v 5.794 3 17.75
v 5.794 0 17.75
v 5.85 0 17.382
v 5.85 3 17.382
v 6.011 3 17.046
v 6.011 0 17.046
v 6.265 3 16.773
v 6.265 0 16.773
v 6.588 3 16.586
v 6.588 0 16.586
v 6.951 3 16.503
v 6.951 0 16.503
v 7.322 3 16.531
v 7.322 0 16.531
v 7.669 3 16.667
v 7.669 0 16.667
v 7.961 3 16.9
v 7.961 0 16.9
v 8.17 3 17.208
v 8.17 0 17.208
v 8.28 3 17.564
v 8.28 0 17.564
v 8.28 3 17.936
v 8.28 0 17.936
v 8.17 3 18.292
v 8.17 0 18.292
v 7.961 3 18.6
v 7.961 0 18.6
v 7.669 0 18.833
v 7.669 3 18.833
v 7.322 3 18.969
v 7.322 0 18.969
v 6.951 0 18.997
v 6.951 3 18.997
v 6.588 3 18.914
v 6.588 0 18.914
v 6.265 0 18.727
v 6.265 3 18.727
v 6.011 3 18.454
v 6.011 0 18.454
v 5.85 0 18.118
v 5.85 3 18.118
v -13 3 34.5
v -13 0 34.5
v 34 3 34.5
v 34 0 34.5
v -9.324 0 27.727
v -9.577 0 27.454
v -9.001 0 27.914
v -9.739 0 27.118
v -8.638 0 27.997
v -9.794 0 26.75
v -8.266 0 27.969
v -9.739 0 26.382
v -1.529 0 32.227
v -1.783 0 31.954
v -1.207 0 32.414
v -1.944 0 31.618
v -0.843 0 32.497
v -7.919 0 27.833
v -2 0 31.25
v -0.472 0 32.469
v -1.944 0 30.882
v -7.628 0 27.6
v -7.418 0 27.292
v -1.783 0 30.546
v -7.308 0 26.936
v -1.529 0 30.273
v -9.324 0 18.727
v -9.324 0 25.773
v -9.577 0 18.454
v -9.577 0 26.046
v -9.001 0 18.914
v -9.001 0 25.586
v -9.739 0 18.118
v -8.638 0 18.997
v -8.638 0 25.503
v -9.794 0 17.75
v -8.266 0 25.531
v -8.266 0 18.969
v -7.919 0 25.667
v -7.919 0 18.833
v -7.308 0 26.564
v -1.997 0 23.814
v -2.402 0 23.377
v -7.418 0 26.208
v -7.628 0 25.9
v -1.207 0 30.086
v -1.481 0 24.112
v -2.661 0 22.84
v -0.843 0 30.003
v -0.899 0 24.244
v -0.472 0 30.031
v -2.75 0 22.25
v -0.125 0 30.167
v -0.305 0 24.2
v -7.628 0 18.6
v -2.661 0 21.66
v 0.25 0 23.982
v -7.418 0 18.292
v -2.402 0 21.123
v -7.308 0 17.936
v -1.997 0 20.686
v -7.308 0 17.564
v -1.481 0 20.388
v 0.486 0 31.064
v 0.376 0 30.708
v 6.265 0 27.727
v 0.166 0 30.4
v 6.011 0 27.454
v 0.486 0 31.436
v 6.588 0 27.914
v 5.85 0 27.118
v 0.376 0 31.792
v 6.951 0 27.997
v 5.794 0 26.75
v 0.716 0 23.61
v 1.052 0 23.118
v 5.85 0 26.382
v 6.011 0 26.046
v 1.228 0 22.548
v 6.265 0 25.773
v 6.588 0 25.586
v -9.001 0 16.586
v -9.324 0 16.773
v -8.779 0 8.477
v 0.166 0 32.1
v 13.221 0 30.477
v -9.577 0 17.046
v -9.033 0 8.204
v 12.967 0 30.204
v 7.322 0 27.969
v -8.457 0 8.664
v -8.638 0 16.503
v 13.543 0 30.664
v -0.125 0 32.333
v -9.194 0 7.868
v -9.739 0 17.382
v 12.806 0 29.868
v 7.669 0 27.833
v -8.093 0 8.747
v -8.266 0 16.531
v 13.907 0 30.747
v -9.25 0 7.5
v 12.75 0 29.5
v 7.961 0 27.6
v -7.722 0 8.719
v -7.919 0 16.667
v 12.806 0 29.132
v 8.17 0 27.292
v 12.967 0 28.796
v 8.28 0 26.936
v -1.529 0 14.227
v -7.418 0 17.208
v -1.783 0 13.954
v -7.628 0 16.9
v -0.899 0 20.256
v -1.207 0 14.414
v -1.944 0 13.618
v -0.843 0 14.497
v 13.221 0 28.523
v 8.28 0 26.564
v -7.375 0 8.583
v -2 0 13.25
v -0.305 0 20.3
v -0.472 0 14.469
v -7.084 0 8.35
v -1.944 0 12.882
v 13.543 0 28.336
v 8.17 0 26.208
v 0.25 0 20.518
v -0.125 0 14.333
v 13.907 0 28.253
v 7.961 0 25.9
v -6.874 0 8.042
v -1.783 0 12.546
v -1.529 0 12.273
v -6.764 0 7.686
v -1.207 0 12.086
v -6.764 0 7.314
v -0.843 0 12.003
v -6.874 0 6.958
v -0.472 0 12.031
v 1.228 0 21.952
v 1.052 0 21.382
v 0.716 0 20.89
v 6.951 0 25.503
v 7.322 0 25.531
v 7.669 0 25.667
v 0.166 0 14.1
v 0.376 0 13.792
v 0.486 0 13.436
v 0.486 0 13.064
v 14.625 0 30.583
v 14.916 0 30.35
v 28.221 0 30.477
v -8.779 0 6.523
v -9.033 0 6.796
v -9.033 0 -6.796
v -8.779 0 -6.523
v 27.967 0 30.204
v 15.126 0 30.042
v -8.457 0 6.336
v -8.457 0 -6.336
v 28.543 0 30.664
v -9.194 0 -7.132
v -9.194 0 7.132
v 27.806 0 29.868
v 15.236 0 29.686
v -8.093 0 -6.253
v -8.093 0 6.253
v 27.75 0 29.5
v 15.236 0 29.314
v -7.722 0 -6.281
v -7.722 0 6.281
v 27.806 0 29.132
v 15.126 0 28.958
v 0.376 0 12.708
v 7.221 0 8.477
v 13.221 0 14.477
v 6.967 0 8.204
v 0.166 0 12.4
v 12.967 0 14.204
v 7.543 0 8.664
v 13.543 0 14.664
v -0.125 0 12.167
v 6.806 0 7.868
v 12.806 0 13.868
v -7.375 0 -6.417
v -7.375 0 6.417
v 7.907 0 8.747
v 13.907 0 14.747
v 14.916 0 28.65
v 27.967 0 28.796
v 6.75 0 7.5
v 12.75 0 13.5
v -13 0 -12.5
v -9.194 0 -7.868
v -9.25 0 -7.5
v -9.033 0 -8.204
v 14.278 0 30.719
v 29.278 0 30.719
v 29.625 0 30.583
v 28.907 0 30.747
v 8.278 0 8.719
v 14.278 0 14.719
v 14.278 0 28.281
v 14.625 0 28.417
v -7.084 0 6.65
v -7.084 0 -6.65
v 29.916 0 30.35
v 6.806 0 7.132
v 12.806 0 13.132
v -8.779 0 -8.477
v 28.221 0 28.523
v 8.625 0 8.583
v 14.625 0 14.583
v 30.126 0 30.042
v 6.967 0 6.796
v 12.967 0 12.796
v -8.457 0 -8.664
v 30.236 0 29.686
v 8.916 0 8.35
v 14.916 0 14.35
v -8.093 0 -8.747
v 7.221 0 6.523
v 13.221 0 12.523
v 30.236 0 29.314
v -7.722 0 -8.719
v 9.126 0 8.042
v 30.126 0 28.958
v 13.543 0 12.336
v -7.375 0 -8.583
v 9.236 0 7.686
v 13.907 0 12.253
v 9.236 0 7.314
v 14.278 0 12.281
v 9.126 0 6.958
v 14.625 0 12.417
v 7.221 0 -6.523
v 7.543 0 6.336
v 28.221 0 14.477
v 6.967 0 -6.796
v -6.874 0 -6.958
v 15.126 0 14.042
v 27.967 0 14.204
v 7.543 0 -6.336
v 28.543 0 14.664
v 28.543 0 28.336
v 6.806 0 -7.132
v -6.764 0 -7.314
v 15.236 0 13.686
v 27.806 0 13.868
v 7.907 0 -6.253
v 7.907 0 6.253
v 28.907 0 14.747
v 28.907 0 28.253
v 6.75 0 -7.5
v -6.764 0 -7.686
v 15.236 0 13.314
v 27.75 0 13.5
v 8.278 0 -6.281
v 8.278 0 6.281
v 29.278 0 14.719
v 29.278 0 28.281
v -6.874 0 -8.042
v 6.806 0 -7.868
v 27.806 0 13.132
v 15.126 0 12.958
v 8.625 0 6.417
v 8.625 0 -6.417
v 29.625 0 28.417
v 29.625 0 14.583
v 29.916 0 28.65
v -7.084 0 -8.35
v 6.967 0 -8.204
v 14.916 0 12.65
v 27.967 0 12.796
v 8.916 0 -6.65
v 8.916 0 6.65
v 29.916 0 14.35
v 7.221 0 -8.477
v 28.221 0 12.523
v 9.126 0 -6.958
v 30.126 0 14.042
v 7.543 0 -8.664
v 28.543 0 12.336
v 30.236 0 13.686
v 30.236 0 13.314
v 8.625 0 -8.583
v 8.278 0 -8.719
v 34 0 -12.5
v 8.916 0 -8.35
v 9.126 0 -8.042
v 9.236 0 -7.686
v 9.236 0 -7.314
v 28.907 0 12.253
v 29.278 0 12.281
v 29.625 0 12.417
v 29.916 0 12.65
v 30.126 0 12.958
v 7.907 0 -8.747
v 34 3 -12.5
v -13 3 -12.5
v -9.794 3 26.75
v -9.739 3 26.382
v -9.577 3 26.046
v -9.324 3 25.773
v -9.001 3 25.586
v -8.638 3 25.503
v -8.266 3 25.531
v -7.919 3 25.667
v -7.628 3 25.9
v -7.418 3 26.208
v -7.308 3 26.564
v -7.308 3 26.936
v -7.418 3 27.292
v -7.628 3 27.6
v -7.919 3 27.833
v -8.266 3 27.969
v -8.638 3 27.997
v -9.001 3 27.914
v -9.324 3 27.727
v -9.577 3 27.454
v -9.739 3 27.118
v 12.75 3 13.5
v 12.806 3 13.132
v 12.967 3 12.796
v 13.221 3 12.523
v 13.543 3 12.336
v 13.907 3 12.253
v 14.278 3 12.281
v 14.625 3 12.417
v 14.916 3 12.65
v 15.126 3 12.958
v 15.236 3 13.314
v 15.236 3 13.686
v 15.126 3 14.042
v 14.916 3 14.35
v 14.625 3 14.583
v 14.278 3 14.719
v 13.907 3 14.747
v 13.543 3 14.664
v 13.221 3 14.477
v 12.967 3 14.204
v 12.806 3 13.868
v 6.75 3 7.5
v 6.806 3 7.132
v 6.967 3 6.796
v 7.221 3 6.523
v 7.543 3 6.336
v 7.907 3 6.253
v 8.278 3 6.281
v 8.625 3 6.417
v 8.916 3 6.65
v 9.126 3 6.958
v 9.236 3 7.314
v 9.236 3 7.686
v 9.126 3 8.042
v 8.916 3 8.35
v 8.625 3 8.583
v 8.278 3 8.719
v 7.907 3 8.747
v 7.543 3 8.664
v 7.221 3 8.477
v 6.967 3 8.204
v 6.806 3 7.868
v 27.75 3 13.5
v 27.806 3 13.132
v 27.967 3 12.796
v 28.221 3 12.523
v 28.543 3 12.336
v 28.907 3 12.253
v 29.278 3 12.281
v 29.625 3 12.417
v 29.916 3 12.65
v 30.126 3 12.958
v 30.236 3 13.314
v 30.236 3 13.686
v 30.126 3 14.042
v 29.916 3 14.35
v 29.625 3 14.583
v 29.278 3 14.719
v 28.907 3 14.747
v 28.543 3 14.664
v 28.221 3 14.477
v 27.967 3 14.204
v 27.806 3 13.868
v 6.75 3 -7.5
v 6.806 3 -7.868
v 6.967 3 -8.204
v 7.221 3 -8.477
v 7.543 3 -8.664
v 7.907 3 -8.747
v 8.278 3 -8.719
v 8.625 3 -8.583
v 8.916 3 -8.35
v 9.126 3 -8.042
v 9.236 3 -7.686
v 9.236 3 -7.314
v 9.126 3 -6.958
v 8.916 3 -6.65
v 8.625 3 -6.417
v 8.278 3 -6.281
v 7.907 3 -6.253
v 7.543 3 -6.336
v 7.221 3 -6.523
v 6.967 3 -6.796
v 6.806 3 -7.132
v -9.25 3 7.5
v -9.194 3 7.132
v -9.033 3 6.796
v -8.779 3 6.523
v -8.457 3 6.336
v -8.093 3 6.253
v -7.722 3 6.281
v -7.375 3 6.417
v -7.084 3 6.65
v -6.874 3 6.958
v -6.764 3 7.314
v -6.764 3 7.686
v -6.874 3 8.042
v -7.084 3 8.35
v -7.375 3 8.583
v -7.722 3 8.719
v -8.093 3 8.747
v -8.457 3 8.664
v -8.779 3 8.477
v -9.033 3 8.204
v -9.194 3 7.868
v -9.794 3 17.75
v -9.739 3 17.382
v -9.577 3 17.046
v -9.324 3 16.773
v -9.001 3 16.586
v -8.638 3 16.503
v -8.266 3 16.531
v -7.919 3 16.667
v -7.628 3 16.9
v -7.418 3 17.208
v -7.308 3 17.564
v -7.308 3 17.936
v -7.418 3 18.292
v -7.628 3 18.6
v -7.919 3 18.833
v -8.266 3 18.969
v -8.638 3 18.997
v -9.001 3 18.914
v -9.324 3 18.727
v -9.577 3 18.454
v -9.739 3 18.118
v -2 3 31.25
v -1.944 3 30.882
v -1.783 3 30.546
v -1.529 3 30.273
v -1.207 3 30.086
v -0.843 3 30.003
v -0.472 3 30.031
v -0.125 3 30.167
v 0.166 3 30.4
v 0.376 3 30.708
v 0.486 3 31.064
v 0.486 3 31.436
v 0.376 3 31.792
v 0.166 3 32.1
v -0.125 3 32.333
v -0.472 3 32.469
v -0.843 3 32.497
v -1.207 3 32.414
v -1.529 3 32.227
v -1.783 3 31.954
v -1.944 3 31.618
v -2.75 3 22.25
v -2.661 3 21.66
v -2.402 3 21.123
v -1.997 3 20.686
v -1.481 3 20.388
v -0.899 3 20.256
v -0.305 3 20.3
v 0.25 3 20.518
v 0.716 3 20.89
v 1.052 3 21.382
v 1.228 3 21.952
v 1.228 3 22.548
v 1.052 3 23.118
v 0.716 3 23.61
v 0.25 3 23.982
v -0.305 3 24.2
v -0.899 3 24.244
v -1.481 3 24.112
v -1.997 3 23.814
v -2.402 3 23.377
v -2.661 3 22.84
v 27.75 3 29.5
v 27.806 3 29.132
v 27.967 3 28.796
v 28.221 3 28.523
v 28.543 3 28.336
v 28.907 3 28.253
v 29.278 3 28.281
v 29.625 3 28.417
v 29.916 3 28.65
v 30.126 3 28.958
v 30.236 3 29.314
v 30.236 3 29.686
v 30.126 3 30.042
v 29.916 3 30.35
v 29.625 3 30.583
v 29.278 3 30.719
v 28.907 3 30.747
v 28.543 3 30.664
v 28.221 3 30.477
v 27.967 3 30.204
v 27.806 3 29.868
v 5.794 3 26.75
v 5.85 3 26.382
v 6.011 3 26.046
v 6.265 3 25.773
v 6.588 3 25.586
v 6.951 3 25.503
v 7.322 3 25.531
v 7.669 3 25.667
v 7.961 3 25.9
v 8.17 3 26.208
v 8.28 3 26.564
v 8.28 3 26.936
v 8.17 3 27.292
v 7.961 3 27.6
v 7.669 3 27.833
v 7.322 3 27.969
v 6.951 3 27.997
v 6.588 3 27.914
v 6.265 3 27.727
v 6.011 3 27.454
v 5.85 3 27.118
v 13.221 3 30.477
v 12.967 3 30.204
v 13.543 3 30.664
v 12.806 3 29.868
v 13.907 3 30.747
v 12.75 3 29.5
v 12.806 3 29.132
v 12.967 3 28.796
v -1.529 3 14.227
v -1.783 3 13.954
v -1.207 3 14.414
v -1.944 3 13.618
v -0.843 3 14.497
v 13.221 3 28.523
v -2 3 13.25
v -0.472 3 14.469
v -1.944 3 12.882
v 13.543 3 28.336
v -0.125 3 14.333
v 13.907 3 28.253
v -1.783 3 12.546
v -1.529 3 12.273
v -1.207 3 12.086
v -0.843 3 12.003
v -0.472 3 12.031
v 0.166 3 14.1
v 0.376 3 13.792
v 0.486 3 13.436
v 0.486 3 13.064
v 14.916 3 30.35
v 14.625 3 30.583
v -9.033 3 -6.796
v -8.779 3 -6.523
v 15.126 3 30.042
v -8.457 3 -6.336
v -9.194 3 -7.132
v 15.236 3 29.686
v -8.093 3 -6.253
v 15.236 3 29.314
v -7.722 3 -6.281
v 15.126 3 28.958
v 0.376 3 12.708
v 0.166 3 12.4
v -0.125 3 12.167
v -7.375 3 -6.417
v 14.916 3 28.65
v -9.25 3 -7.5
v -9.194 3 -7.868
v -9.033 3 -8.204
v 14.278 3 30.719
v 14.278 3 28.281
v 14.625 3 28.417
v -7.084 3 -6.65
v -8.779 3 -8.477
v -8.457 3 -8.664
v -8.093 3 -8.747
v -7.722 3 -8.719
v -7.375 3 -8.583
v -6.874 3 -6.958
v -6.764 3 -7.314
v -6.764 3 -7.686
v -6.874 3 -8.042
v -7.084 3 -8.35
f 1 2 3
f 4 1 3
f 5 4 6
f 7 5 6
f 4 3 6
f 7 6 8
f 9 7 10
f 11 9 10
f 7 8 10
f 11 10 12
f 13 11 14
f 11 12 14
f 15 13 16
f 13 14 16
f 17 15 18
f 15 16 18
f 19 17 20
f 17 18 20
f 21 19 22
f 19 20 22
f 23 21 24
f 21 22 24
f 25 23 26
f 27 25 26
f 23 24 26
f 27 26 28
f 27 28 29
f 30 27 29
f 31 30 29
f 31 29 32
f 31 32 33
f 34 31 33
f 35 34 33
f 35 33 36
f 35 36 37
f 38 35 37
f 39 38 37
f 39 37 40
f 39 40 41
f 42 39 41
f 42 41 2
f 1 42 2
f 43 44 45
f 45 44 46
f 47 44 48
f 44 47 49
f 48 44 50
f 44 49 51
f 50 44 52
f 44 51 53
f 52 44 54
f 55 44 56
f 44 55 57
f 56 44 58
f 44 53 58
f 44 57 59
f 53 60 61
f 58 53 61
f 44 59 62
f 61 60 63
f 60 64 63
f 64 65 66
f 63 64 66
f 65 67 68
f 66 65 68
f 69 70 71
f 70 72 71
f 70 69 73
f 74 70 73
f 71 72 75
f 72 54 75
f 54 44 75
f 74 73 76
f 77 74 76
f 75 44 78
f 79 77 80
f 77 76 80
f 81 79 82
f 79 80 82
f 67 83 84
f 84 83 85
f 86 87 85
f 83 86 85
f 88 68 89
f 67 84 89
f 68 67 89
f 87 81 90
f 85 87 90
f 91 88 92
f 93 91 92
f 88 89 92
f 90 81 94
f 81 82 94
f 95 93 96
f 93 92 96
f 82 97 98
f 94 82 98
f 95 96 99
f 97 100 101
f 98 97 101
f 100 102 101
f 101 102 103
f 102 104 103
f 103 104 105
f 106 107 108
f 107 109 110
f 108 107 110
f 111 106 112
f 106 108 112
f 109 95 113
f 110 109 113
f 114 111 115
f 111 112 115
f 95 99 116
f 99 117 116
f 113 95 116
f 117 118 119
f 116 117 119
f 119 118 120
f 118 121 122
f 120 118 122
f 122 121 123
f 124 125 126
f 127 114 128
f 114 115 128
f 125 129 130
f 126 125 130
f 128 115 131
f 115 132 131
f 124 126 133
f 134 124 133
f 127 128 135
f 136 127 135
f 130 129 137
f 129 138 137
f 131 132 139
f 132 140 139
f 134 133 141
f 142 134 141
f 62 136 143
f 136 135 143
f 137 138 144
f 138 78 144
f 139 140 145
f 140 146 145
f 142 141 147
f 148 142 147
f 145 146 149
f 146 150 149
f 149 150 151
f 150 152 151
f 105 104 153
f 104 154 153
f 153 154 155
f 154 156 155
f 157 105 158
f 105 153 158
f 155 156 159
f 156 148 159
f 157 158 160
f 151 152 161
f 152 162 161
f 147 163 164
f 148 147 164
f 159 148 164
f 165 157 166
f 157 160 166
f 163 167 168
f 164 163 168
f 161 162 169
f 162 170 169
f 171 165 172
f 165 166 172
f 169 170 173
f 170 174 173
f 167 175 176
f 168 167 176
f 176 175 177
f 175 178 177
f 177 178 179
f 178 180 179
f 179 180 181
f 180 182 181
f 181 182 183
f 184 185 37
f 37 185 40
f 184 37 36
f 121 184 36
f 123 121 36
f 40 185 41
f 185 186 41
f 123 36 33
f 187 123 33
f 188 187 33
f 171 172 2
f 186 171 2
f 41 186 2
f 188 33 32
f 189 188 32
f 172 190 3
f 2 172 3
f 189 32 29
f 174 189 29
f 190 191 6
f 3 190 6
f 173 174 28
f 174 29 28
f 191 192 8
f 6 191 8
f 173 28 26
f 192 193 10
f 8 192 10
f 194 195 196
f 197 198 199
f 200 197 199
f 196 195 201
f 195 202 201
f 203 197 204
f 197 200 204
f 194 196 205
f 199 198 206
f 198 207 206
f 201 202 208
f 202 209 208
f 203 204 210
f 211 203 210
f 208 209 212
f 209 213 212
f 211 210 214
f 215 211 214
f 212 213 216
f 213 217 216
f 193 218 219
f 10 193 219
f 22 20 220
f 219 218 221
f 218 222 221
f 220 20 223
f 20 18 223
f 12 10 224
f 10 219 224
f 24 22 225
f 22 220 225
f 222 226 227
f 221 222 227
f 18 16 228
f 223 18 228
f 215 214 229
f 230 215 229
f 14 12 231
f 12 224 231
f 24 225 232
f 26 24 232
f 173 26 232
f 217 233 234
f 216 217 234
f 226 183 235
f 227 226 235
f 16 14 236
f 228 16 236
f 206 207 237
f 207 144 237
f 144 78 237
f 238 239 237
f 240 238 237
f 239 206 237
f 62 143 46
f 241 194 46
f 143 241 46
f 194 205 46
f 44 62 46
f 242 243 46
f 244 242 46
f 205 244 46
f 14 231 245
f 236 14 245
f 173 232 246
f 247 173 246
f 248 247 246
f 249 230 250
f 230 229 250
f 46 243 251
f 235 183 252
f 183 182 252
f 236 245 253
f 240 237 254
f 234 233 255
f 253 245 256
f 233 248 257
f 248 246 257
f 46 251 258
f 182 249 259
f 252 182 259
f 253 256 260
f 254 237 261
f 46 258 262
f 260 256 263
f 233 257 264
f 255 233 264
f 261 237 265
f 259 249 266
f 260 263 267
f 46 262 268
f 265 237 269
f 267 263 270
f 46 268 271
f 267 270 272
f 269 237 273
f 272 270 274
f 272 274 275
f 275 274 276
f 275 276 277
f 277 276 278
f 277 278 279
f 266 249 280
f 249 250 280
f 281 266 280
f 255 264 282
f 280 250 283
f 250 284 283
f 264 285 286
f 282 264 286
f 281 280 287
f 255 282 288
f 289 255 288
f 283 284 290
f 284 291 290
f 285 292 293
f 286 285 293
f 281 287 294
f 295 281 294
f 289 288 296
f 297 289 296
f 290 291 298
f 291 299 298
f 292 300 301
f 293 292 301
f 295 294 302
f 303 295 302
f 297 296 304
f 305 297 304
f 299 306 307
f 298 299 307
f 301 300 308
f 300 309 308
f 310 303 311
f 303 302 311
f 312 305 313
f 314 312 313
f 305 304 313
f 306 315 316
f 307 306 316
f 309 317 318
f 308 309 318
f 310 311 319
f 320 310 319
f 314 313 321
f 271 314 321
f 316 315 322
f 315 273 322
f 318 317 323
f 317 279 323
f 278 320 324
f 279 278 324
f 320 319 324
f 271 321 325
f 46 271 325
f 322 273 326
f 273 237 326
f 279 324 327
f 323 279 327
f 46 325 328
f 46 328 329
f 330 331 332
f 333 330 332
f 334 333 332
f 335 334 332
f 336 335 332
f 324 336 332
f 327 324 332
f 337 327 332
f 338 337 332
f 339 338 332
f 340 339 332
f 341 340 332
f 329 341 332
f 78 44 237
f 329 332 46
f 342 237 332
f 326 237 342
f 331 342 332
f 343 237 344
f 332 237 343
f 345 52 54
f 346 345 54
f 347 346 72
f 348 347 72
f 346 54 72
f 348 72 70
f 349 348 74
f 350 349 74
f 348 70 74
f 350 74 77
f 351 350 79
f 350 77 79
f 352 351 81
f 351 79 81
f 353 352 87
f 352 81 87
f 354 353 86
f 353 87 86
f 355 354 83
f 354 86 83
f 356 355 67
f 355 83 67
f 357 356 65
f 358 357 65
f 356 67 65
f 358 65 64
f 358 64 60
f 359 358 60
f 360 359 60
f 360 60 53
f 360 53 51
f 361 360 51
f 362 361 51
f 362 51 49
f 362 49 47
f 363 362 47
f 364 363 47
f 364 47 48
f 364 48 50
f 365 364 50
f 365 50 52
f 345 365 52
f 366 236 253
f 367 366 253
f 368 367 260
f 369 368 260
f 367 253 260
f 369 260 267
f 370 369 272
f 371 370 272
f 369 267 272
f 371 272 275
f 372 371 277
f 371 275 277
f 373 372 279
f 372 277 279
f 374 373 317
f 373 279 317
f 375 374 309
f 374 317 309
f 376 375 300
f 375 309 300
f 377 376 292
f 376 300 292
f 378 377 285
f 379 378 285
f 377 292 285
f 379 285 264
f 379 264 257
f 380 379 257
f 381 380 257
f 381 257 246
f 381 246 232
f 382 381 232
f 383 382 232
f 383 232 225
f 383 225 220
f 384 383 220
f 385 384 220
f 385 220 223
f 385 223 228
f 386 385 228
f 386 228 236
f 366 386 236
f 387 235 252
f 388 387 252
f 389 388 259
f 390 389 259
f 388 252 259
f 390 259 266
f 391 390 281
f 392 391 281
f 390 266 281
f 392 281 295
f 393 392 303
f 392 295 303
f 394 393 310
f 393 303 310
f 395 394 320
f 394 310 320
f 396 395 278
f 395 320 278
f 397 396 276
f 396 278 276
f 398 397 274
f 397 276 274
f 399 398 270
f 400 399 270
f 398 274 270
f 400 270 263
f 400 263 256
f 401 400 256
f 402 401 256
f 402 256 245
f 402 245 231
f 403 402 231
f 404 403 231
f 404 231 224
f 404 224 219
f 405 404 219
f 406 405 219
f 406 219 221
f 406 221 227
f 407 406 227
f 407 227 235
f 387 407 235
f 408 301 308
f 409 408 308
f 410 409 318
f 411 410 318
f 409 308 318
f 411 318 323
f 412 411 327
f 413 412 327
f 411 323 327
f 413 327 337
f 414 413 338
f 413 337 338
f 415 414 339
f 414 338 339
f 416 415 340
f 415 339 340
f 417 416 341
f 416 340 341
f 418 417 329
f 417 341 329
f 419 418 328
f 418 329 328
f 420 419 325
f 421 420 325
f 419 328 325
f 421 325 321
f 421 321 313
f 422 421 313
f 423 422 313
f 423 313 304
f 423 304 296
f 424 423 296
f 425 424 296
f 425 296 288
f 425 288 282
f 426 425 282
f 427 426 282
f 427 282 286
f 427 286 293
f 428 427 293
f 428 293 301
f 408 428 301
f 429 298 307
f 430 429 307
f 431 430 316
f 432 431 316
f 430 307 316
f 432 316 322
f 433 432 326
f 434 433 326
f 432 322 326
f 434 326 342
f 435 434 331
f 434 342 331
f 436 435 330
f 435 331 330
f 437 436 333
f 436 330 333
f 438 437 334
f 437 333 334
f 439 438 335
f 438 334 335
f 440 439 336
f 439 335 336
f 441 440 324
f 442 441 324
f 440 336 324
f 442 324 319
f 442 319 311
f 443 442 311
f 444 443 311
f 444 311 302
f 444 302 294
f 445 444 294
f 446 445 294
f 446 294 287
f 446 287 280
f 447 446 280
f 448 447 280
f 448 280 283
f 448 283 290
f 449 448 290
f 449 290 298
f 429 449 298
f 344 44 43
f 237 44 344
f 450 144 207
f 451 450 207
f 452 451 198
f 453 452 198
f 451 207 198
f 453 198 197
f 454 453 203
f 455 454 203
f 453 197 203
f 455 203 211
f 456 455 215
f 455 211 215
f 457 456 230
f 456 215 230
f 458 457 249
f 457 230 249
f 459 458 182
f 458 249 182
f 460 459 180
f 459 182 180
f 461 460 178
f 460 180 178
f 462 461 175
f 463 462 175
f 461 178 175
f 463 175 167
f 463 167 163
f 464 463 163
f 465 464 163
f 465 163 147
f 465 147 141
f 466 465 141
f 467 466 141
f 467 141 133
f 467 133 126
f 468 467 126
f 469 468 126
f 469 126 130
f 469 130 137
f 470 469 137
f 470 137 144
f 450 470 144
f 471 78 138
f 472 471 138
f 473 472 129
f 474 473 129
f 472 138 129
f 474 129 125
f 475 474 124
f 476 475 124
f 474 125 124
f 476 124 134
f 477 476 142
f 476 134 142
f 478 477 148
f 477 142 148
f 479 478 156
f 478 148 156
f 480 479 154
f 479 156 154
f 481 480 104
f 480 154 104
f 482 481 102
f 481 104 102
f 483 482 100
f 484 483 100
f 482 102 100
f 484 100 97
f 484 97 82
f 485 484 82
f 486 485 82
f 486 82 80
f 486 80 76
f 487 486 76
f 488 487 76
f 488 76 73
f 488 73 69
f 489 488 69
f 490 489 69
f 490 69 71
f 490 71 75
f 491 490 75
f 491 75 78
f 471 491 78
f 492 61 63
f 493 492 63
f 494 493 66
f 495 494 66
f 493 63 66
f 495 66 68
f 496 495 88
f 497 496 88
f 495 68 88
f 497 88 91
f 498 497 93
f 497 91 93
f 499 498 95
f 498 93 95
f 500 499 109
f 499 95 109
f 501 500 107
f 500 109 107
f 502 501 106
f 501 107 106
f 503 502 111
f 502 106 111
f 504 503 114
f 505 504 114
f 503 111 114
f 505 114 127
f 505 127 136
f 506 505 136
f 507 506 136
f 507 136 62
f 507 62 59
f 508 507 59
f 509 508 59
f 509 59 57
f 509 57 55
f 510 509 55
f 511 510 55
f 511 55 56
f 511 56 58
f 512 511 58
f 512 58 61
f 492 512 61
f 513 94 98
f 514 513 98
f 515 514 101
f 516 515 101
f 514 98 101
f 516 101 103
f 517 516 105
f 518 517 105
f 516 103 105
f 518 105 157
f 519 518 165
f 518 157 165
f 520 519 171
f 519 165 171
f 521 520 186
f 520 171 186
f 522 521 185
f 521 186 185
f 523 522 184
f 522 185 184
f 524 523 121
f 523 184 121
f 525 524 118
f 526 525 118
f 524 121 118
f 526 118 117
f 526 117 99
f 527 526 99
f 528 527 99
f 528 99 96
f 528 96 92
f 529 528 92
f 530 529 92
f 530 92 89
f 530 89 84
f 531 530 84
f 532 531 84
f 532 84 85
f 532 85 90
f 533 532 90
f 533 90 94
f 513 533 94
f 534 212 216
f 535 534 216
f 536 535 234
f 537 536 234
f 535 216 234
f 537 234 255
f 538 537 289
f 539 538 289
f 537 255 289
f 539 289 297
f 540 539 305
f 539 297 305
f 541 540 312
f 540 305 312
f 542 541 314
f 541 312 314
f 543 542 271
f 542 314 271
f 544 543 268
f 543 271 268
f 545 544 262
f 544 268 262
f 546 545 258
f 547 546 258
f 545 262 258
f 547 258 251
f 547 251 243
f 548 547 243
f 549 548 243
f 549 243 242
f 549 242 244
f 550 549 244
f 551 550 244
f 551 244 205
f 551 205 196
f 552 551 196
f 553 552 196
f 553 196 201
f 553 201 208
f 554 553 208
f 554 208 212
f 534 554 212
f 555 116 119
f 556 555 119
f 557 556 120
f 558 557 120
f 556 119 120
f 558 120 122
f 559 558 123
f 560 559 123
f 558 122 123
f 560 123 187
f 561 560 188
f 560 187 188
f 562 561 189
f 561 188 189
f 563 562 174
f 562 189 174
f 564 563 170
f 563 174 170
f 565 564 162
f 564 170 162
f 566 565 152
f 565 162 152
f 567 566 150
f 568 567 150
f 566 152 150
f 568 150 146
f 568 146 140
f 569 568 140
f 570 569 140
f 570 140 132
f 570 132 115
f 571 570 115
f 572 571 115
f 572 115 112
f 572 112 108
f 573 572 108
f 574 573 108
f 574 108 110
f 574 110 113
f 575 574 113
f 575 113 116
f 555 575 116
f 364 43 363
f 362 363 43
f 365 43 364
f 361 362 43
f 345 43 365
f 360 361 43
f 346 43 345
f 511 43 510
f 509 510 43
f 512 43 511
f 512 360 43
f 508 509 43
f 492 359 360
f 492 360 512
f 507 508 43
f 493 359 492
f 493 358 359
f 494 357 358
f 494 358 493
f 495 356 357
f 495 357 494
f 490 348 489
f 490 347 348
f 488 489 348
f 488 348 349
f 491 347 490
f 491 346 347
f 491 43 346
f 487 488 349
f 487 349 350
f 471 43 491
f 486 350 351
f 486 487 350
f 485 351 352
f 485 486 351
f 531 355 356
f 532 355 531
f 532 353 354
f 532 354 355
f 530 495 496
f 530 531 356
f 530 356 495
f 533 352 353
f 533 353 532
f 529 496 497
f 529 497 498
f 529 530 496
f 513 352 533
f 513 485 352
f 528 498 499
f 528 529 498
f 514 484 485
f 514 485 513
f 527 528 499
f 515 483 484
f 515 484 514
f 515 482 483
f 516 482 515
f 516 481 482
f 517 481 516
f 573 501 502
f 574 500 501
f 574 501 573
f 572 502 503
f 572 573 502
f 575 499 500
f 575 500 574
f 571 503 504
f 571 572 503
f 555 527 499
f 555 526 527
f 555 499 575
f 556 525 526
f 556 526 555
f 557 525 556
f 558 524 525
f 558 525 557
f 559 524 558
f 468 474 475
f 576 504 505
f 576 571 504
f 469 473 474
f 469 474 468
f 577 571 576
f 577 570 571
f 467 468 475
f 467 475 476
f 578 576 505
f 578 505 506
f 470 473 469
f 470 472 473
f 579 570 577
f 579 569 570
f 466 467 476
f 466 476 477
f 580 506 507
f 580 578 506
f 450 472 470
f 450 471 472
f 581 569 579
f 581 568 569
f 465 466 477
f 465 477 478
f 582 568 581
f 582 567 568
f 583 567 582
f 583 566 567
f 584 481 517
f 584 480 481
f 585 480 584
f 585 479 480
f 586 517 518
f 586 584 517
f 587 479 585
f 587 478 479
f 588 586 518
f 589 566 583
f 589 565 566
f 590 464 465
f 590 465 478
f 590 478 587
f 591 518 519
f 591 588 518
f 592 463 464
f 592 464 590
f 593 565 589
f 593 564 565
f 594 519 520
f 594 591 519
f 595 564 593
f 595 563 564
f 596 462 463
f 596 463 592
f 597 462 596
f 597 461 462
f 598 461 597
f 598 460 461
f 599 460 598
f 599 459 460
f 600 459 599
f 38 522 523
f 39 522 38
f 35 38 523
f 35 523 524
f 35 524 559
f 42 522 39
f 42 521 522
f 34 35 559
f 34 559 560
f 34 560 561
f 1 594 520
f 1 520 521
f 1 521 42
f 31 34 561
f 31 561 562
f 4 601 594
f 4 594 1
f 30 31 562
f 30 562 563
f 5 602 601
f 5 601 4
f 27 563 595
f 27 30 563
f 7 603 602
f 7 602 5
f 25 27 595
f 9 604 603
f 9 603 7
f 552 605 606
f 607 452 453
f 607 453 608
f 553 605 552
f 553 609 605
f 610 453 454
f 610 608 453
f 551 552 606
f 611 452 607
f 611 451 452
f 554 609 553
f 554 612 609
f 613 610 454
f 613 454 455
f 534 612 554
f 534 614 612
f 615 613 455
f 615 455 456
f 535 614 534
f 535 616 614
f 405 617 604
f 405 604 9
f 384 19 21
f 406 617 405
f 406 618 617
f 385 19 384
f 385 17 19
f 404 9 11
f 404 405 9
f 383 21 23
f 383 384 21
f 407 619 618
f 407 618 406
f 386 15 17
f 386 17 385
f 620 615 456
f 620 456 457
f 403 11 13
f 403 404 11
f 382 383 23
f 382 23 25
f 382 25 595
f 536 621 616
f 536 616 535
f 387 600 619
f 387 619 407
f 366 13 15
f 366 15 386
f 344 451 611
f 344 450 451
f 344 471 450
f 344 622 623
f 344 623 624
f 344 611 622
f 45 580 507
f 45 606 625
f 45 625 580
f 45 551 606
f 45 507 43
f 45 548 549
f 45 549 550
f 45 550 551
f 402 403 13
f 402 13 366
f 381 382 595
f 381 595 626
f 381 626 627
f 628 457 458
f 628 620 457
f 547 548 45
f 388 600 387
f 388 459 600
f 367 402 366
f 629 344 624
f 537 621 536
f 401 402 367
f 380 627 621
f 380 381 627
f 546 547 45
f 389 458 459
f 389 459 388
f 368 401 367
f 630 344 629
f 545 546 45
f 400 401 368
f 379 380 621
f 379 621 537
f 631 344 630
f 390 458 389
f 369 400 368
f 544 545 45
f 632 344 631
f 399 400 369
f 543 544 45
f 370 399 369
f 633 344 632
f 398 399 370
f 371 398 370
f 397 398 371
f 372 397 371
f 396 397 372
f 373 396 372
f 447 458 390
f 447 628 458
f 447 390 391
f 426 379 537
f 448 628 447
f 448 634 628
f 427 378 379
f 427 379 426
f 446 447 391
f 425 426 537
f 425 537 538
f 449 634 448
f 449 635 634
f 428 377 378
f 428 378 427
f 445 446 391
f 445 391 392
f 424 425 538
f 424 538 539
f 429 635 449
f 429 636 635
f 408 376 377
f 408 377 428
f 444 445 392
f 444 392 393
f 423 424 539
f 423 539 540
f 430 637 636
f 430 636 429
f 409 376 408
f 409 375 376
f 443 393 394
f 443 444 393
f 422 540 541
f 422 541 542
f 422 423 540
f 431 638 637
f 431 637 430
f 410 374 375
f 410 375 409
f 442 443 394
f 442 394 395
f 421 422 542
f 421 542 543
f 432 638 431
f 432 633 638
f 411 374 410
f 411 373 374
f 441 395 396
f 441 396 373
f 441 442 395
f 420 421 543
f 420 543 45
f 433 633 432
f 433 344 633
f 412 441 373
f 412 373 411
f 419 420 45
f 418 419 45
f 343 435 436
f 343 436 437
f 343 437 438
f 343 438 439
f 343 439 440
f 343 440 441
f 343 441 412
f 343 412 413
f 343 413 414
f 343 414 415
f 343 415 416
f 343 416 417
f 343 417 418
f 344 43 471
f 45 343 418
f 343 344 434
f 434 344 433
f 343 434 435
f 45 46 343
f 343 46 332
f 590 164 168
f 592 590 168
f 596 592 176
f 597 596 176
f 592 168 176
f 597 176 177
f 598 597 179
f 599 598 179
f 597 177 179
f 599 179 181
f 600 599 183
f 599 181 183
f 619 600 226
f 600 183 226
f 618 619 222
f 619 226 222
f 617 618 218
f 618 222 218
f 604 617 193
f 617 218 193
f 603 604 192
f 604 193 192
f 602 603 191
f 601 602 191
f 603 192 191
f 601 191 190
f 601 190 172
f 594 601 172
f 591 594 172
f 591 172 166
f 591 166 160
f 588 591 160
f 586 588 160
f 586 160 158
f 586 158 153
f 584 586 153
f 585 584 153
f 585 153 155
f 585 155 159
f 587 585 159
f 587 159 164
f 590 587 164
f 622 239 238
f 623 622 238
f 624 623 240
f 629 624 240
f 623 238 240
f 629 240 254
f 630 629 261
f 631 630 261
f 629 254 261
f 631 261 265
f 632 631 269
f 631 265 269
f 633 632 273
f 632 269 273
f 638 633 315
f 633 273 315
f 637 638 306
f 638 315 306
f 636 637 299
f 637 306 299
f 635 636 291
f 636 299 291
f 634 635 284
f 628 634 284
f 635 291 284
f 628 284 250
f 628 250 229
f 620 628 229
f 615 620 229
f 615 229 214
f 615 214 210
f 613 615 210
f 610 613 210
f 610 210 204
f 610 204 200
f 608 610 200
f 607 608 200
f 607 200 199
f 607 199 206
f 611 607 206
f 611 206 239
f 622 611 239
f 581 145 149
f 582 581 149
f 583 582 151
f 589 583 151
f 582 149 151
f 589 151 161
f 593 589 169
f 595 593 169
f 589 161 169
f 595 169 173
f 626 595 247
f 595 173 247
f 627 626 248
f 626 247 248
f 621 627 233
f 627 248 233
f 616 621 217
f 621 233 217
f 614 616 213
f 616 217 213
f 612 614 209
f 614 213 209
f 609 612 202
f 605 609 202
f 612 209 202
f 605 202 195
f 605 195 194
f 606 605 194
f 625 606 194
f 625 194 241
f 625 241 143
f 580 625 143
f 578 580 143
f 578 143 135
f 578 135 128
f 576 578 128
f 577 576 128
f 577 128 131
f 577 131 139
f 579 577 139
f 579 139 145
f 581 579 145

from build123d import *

# Parameters (mm, degrees)
SKETCH1_W                   = 47
SKETCH1_H                   = 47
BOSS_EXTRUDE1_DEPTH         = 3
TAP_DRILL_FOR_M3X0_5_TAP1_D = 2.5
TAP_DRILL_FOR_M3X0_5_TAP2_D = 2.5
F_4_0_4_DIAMETER_HOLE1_D    = 4


with BuildPart() as part:
    # Sketch1 → Boss-Extrude1 (new body)
    with BuildSketch(Plane(origin=(0, 0, 0), x_dir=(1, 0, 0), z_dir=(0, 1, 0))):
        with Locations((10.5, -11)):
            Rectangle(SKETCH1_W, SKETCH1_H)
    extrude(amount=BOSS_EXTRUDE1_DEPTH)

    # Tap Drill for M3x0.5 Tap1 (through all)
    with Locations(Plane(origin=(0, 3, 0), x_dir=(1, 0, 0), z_dir=(0, 1, 0))):
        with Locations((-8, 7.5), (8, 7.5), (8, -7.5), (-8, -7.5), (14, -13.5), (29, -13.5), (29, -29.5), (14, -29.5)):
            Hole(TAP_DRILL_FOR_M3X0_5_TAP1_D / 2)

    # Tap Drill for M3x0.5 Tap2 (through all)
    with Locations(Plane(origin=(0, 3, 0), x_dir=(1, 0, 0), z_dir=(0, 1, 0))):
        with Locations((-0.75, -13.25), (-8.544228634, -17.75), (-8.544228634, -26.75), (-0.75, -31.25), (7.044228634, -26.75), (7.044228634, -17.75)):
            Hole(TAP_DRILL_FOR_M3X0_5_TAP2_D / 2)

    # Ø4.0 (4) Diameter Hole1 (through all)
    with Locations(Plane(origin=(0, 3, 0), x_dir=(1, 0, 0), z_dir=(0, 1, 0))):
        with Locations((-0.75, -22.25)):
            Hole(F_4_0_4_DIAMETER_HOLE1_D / 2)


solid = part.part
